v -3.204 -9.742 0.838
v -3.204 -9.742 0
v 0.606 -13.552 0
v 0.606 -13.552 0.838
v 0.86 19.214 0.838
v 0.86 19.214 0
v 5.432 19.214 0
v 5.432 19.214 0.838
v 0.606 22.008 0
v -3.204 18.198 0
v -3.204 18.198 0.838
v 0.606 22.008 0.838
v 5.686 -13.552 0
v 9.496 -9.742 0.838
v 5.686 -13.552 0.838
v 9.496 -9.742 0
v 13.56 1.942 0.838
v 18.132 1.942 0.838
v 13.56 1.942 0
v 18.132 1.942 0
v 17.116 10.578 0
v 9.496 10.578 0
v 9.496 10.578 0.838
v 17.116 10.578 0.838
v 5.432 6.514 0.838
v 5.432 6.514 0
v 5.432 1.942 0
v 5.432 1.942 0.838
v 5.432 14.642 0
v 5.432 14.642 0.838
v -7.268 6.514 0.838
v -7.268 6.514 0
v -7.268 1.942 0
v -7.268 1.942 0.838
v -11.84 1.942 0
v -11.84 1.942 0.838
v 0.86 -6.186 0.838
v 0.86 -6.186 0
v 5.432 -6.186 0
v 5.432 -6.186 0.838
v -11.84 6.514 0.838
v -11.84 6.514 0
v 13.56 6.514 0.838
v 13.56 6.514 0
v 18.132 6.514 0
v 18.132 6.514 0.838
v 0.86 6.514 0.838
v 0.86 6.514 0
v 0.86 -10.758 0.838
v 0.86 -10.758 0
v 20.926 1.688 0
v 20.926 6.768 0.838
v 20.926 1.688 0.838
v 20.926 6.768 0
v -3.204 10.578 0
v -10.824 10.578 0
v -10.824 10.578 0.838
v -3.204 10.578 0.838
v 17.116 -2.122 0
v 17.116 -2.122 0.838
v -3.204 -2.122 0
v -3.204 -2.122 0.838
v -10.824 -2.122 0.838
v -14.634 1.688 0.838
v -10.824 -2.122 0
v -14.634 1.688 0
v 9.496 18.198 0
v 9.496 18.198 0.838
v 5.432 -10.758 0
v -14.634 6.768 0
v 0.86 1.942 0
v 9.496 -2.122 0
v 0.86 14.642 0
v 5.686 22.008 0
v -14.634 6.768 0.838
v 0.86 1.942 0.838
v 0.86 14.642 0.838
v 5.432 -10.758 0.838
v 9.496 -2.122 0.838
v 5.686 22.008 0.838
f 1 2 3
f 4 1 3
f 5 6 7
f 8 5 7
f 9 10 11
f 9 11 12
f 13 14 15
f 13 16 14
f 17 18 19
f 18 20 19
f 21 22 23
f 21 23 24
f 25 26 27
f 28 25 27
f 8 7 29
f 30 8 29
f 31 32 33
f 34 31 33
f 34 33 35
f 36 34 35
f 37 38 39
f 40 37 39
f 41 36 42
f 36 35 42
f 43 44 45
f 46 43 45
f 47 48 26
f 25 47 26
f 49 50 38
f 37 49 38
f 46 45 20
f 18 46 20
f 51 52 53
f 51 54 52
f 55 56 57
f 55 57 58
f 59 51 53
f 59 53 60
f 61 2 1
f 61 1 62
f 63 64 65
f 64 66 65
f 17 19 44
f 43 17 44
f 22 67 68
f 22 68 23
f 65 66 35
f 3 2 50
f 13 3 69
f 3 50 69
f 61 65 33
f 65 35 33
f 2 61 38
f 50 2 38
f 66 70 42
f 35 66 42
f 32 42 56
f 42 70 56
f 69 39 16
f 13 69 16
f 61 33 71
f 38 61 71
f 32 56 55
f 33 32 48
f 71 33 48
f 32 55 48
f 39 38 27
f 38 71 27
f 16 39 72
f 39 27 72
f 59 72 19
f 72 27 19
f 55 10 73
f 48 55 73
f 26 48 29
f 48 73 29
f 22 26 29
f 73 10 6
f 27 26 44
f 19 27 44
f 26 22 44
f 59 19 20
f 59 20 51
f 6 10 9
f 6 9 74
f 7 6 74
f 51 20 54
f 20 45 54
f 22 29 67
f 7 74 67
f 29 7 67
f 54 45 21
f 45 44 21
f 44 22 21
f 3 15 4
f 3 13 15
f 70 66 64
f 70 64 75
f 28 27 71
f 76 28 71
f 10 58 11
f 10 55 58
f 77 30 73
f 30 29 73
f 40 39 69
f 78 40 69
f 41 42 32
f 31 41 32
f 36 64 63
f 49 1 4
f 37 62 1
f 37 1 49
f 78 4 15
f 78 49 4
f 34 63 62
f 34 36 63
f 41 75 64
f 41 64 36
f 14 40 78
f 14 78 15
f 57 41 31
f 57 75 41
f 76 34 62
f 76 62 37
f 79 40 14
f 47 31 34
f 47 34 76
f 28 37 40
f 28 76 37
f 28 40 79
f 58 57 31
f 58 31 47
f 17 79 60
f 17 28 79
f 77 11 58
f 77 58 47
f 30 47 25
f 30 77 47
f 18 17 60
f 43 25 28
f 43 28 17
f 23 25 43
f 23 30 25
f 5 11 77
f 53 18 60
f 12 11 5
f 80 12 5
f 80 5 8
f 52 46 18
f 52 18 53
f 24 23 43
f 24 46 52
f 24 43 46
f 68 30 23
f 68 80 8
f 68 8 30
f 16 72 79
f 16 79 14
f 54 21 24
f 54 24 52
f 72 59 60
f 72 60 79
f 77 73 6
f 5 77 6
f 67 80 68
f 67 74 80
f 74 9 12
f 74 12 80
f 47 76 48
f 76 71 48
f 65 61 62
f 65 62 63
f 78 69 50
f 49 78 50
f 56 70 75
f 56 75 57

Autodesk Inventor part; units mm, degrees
ref_plane "YZ Plane" through (0, 0, 0) normal (1, 0, 0) x (0, 1, 0)
ref_plane "XZ Plane" through (0, 0, 0) normal (0, 1, 0) x (-1, 0, 0)
ref_plane "XY Plane" through (0, 0, 0) normal (0, 0, 1) x (1, 0, 0)
sketch "Sketch1" plane through (0, 0, 0) normal (0, 0, 1) x (1, 0, 0)
  line L0 (20.9262, 6.7683) -> (20.9262, 1.6883)
  line L1 (-14.6338, 1.6883) -> (-14.6338, 6.7683)
  line L2 (0.6062, 22.0083) -> (5.6862, 22.0083)
  line L3 (5.6862, -13.5517) -> (0.6062, -13.5517)
  line L4 (-3.2038, -9.7417) -> (-3.2038, -2.1217)
  line L5 (-3.2038, 10.5783) -> (-3.2038, 18.1983)
  line L6 (-10.8238, 10.5783) -> (-3.2038, 10.5783)
  line L7 (9.4962, 10.5783) -> (17.1162, 10.5783)
  line L8 (17.1162, -2.1217) -> (9.4962, -2.1217)
  line L9 (-3.2038, -2.1217) -> (-10.8238, -2.1217)
  line L10 (9.4962, 18.1983) -> (9.4962, 10.5783)
  line L11 (9.4962, -2.1217) -> (9.4962, -9.7417)
  line L12 (-3.2038, 18.1983) -> (0.6062, 22.0083)
  line L13 (5.6862, 22.0083) -> (9.4962, 18.1983)
  line L14 (17.1162, 10.5783) -> (20.9262, 6.7683)
  line L15 (20.9262, 1.6883) -> (17.1162, -2.1217)
  line L16 (9.4962, -9.7417) -> (5.6862, -13.5517)
  line L17 (-3.2038, -9.7417) -> (0.6062, -13.5517)
  line L18 (-14.6338, 1.6883) -> (-10.8238, -2.1217)
  line L19 (-14.6338, 6.7683) -> (-10.8238, 10.5783)
  line L20 (0.8602, 19.2143) -> (5.4322, 19.2143)
  line L21 (5.4322, 19.2143) -> (5.4322, 14.6423)
  line L22 (5.4322, 14.6423) -> (0.8602, 14.6423)
  line L23 (0.8602, 14.6423) -> (0.8602, 19.2143)
  line L24 (-11.8398, 6.5143) -> (-7.2678, 6.5143)
  line L25 (-7.2678, 6.5143) -> (-7.2678, 1.9423)
  line L26 (-7.2678, 1.9423) -> (-11.8398, 1.9423)
  line L27 (-11.8398, 1.9423) -> (-11.8398, 6.5143)
  line L28 (0.8602, -6.1857) -> (5.4322, -6.1857)
  line L29 (5.4322, -6.1857) -> (5.4322, -10.7577)
  line L30 (5.4322, -10.7577) -> (0.8602, -10.7577)
  line L31 (0.8602, -10.7577) -> (0.8602, -6.1857)
  line L32 (13.5602, 6.5143) -> (18.1322, 6.5143)
  line L33 (18.1322, 6.5143) -> (18.1322, 1.9423)
  line L34 (18.1322, 1.9423) -> (13.5602, 1.9423)
  line L35 (13.5602, 1.9423) -> (13.5602, 6.5143)
  line L36 (0.8602, 6.5143) -> (5.4322, 6.5143)
  line L37 (5.4322, 6.5143) -> (5.4322, 1.9423)
  line L38 (5.4322, 1.9423) -> (0.8602, 1.9423)
  line L39 (0.8602, 1.9423) -> (0.8602, 6.5143)
  point P0 (-14.6338, 10.5783)
  point P1 (20.9262, -2.1217)
  point P2 (20.9262, 10.5783)
  point P3 (-14.6338, -2.1217)
  point P4 (-3.2038, 22.0083)
  point P5 (9.4962, -13.5517)
  point P6 (9.4962, 22.0083)
  point P7 (-3.2038, -13.5517)
  dimension "d0" = 35.56
  dimension "d1" = 35.56
  dimension "d2" = 12.7
  dimension "d3" = 12.7
  dimension "d4" = 12.7
  dimension "d5" = 12.7
  dimension "d6" = 11.43
  dimension "d7" = 11.43
  dimension "d8" = 11.43
  dimension "d9" = 11.43
  dimension "d10" = 3.81
  dimension "d11" = 3.81
  dimension "d12" = 3.81
  dimension "d13" = 3.81
  dimension "d14" = 3.81
  dimension "d15" = 3.81
  dimension "d16" = 3.81
  dimension "d17" = 3.81
  dimension "d18" = 3.81
  dimension "d19" = 3.81
  dimension "d20" = 3.81
  dimension "d21" = 3.81
  dimension "d22" = 3.81
  dimension "d23" = 3.81
  dimension "d24" = 3.81
  dimension "d25" = 3.81
  dimension "d26" = 4.572
  dimension "d27" = 4.572
  dimension "d28" = 4.572
  dimension "d29" = 4.572
  dimension "d30" = 4.572
  dimension "d31" = 4.572
  dimension "d32" = 4.572
  dimension "d33" = 4.572
  dimension "d34" = 4.572
  dimension "d35" = 4.572
  dimension "d36" = 2.794
  dimension "d37" = 2.794
  dimension "d38" = 2.794
  dimension "d39" = 2.794
  dimension "d40" = 4.064
  dimension "d41" = 4.064
  dimension "d42" = 11.43
extrude "Extrusion1" add sketch "Sketch1" along normal blind 0.8382
sketch "Sketch2" plane through (0, 0, 0.8382) normal (0, 0, 1) x (1, 0, 0)
  line L0 (5.4322, 19.2143) -> (5.4322, 14.6423) projected
  line L1 (5.4322, 14.6423) -> (0.8602, 14.6423) projected
  line L2 (0.8602, 14.6423) -> (0.8602, 19.2143) projected
  line L3 (0.8602, 19.2143) -> (5.4322, 19.2143) projected
  circle A0 centre (3.1462, 16.9283) radius 2.286
  point P0 (0, 0)
surface extrude "ExtrusionSrf1" sketch "Sketch2" against normal up to surface (0.8382 mm away) shown no curves A0
pattern_linear "Rectangular Pattern1" count 3 spacing 12.7 along (0, -1, 0) of "ExtrusionSrf1"
sketch "Sketch3" plane through (0, 0, 0.8382) normal (0, 0, 1) x (1, 0, 0)
  line L0 (-7.2678, 6.5143) -> (-7.2678, 1.9423) projected
  line L1 (-7.2678, 1.9423) -> (-11.8398, 1.9423) projected
  line L2 (-11.8398, 1.9423) -> (-11.8398, 6.5143) projected
  line L3 (-11.8398, 6.5143) -> (-7.2678, 6.5143) projected
  circle A0 centre (-9.5538, 4.2283) radius 2.286
  point P0 (0, 0)
surface extrude "ExtrusionSrf4" sketch "Sketch3" against normal up to surface (0.8382 mm away) shown no curves A0
pattern_linear "Rectangular Pattern2" count 2 spacing 25.4 along (1, 0, 0) of "ExtrusionSrf4"
equation "\"d11\" = d10"
equation "\"d12\" = d10"
equation "\"d13\" = d12"
equation "\"d14\" = d10"
equation "\"d15\" = d14"
equation "\"d16\" = d10"
equation "\"d17\" = d16"
equation "\"d18\" = d10"
equation "\"d19\" = d18"
equation "\"d20\" = d10"
equation "\"d21\" = d20"
equation "\"d22\" = d10"
equation "\"d23\" = d22"
equation "\"d24\" = d10"
equation "\"d25\" = d24"
properties part number "276-1110" material "Steel"
